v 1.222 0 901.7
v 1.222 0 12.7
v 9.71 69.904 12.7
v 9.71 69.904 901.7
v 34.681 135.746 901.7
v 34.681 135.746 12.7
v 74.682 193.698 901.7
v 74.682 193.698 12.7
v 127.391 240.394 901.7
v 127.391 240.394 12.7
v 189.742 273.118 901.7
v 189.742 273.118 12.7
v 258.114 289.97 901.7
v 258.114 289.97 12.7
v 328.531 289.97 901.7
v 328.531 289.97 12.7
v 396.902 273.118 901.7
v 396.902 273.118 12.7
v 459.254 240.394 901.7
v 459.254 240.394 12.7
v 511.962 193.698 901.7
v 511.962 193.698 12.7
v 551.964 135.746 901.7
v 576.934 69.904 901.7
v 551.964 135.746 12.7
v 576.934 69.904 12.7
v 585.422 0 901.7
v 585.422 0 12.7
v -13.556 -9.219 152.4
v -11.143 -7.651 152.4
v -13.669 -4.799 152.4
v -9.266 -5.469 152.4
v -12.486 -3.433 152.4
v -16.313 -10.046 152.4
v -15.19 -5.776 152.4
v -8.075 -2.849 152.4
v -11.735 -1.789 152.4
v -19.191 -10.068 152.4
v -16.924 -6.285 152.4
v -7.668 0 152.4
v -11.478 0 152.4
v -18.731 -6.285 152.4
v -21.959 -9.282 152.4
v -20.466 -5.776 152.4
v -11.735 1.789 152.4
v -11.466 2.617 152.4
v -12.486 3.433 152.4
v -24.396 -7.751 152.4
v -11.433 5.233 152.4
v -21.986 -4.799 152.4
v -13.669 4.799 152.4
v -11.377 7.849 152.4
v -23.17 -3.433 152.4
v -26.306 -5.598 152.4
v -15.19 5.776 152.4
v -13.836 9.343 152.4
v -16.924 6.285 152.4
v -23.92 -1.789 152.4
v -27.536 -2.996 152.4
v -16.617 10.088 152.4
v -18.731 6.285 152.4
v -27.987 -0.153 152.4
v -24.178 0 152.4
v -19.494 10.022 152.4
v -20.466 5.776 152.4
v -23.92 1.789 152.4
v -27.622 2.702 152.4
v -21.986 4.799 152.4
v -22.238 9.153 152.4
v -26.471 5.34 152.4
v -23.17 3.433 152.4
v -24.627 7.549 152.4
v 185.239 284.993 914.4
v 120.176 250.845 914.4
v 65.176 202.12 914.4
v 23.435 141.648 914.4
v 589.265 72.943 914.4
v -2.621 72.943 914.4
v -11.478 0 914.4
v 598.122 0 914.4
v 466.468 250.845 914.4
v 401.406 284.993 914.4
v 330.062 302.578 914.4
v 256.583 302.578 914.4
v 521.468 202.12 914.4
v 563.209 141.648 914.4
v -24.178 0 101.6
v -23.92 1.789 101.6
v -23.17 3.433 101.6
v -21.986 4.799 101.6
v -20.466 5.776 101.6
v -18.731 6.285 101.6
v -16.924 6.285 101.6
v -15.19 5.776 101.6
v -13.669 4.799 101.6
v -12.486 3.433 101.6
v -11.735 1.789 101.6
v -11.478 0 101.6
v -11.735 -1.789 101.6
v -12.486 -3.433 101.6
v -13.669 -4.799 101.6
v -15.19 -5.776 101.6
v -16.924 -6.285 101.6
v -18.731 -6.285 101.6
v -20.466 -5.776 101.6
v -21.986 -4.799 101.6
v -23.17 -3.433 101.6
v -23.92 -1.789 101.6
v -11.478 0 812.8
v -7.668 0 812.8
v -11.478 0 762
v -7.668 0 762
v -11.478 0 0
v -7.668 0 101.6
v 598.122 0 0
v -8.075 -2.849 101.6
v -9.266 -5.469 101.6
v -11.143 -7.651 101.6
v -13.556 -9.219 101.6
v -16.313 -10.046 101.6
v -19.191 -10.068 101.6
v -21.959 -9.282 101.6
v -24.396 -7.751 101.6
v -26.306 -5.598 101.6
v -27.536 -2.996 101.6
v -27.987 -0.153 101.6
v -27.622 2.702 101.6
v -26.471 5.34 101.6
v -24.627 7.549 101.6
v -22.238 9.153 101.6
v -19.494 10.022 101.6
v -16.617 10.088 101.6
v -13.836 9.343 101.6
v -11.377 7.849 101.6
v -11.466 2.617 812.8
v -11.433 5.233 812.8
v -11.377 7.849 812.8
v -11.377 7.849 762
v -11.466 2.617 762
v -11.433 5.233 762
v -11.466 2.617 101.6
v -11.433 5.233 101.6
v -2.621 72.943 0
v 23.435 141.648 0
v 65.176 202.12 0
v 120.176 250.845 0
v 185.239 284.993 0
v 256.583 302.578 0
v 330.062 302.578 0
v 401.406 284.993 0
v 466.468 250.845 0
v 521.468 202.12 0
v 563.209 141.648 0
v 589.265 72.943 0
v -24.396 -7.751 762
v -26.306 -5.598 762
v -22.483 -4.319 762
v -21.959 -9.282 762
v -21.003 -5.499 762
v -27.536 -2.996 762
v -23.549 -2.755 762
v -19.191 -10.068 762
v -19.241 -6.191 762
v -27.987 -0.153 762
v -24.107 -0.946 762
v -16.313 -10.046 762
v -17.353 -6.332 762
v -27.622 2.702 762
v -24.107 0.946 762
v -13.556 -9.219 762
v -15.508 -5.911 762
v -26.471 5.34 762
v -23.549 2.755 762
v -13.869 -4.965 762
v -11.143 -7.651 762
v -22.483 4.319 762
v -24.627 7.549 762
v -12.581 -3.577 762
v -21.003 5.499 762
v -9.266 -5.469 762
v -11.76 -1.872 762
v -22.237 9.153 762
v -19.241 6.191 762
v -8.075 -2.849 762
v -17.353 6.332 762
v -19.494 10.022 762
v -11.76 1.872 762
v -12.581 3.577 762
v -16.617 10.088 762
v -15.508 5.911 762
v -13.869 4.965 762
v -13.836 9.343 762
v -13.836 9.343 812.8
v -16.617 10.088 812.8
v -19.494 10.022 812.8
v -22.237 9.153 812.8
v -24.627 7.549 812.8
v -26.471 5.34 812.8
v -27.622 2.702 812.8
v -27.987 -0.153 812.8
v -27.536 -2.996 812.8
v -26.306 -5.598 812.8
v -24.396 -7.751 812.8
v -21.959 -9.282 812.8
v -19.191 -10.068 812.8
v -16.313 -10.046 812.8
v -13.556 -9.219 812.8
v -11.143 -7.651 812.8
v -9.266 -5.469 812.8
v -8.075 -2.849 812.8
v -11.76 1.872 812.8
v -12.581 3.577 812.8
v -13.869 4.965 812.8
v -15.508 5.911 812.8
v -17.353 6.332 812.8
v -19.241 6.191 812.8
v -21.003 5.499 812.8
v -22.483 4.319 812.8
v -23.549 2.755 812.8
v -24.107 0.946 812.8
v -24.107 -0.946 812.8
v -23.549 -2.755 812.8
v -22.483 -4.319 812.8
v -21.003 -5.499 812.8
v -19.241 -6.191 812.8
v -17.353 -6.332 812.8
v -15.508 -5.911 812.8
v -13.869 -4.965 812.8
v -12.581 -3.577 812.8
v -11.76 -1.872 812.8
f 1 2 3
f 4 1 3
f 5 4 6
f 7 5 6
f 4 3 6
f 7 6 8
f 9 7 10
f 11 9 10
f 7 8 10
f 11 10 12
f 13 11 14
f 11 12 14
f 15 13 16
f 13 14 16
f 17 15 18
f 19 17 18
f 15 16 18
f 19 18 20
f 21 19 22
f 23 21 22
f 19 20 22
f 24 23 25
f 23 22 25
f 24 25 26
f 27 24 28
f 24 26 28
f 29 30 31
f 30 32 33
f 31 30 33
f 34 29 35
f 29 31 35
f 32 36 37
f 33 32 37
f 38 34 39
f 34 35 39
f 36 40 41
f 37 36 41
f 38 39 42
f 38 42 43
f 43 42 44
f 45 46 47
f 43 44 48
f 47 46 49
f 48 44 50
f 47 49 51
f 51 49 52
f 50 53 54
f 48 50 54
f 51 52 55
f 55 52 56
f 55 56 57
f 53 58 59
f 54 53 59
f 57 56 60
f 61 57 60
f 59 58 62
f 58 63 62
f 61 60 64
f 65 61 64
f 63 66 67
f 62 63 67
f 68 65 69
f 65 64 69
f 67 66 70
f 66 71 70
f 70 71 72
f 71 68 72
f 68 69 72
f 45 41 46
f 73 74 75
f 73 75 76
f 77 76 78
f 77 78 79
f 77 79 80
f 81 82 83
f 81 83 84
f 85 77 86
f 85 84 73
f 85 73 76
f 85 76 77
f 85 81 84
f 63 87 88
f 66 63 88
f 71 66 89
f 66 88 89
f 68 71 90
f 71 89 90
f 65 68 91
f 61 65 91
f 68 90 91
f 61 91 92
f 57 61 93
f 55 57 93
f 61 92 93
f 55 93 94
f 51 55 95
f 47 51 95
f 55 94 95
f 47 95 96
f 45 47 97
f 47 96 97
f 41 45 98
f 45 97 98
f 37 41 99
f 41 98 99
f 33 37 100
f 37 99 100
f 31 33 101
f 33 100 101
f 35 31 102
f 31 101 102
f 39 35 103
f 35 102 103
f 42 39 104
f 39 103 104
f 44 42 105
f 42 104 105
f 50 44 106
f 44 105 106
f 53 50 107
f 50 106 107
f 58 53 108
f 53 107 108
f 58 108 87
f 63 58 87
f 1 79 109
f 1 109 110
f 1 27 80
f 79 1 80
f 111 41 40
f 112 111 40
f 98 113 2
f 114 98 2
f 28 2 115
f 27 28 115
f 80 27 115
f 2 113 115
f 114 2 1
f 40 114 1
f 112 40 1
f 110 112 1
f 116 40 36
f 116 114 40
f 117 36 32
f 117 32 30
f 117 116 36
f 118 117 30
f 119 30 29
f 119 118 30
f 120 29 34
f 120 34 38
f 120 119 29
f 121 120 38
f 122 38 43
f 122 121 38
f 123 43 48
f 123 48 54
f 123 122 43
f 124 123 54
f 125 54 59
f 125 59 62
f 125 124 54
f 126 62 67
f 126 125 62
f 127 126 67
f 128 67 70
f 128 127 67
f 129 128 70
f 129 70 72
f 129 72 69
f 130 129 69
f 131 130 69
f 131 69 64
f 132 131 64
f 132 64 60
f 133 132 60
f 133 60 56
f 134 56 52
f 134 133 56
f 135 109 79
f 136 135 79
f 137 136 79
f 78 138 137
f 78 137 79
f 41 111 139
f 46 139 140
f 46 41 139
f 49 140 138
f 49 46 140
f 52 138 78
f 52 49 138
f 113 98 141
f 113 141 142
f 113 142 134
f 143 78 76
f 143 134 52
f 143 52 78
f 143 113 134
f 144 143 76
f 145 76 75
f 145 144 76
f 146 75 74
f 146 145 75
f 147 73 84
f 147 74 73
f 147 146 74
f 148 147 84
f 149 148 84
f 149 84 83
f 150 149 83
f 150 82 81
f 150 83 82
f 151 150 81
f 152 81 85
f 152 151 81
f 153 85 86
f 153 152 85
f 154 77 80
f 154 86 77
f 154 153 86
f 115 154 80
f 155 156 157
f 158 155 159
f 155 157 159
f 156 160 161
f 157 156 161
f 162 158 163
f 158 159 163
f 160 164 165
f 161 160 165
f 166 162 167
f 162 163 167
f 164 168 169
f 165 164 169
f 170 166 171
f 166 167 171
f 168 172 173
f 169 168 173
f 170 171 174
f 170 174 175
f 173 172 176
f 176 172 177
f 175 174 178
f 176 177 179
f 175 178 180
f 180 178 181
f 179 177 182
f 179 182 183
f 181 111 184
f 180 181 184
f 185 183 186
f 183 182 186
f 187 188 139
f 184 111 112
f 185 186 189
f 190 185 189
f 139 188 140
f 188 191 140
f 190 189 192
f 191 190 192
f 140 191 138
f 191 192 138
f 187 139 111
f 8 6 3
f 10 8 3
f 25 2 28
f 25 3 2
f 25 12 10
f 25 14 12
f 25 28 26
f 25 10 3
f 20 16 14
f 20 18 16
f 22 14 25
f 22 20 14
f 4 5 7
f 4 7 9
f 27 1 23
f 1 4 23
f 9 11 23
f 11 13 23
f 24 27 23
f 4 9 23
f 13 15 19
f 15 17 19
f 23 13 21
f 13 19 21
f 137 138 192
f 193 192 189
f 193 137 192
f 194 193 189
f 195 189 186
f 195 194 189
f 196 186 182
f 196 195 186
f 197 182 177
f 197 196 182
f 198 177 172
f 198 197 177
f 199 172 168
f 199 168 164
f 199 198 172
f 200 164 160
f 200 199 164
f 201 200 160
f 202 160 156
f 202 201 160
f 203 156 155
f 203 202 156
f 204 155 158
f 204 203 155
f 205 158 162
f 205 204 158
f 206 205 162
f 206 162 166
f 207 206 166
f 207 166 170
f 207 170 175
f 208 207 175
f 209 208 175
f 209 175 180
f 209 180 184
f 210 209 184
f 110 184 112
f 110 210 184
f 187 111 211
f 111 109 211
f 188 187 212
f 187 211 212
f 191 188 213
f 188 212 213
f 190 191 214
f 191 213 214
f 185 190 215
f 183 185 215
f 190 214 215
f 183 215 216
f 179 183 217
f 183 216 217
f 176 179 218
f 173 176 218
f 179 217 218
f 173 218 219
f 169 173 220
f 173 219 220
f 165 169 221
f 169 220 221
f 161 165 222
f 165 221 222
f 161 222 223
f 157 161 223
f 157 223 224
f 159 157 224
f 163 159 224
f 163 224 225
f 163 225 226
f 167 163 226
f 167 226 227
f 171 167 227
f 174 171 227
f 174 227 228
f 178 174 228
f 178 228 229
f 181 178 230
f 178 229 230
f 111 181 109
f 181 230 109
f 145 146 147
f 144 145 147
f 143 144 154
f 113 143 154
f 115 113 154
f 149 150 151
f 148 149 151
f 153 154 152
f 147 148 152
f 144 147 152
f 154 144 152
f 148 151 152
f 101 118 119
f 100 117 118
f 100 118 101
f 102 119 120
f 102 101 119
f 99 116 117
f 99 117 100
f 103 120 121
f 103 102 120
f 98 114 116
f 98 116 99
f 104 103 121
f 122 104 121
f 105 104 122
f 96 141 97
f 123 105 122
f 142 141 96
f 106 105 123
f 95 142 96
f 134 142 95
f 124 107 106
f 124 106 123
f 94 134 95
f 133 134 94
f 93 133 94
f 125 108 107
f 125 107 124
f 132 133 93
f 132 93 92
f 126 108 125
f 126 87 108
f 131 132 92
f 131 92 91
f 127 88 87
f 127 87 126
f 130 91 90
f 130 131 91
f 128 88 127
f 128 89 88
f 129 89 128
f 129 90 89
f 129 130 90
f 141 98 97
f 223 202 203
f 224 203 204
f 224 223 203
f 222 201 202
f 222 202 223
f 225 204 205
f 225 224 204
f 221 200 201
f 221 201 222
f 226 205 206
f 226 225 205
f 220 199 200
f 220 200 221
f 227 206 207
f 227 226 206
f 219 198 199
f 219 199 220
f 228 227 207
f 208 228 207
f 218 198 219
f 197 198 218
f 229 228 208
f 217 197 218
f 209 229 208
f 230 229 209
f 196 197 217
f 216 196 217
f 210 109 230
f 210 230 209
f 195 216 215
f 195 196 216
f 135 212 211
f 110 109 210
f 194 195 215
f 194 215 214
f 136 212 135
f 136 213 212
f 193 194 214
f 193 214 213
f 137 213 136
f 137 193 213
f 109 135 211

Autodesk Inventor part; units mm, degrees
ref_plane "YZ Plane" through (0, 0, 0) normal (1, 0, 0) x (0, 1, 0)
ref_plane "XZ Plane" through (0, 0, 0) normal (0, 1, 0) x (-1, 0, 0)
ref_plane "XY Plane" through (0, 0, 0) normal (0, 0, 1) x (1, 0, 0)
sketch "Sketch1" plane through (0, 0, 0) normal (0, 0, 1) x (1, 0, 0)
  arc A0 (598.1223, 0) -> (-11.4777, 0) centre (293.3223, 0) ccw
  line L0 (-11.4777, 0) -> (598.1223, 0)
  point P0 (0, 0)
  dimension "d0" = 609.6
  dimension "d1" = 304.8
extrude "Extrusion1" add sketch "Sketch1" along normal blind 914.4
shell "Shell1" thickness 12.7 removed faces 1 at (191.7223, 0, 609.6)
ref_plane "Work Plane1" through (0, 0, 812.8) normal (0, 0, 1) x (1, 0, 0)
ref_plane "Work Plane2" through (0, 0, 101.6) normal (0, 0, -1) x (-1, 0, 0)
sketch "Sketch2" plane through (0, 0, 101.6) normal (0, 0, -1) x (-1, 0, 0)
  circle A0 centre (17.8277, 0) radius 10.16
  circle A1 centre (17.8277, 0) radius 6.35
  arc A2 (11.4777, 0) -> (-598.1223, 0) centre (-293.3223, 0) ccw projected
  point P0 (0, 0)
  dimension "d7" = 20.32
  dimension "d8" = 12.7
extrude "Extrusion2" add sketch "Sketch2" against normal blind 50.8
sketch "Sketch3" plane through (0, 0, 812.8) normal (0, 0, 1) x (1, 0, 0)
  arc A0 (-11.3766, 7.8491) -> (-7.6677, 0) centre (-17.8277, 0) ccw projected
  circle A1 centre (-17.8277, 0) radius 10.16
  circle A2 centre (-17.8277, 0) radius 6.35
  point P0 (0, 0)
  point P1 (-7.6677, 0)
  dimension "d11" = 12.7
extrude "Extrusion3" add sketch "Sketch3" against normal blind 50.8
properties part number "chestTop"
